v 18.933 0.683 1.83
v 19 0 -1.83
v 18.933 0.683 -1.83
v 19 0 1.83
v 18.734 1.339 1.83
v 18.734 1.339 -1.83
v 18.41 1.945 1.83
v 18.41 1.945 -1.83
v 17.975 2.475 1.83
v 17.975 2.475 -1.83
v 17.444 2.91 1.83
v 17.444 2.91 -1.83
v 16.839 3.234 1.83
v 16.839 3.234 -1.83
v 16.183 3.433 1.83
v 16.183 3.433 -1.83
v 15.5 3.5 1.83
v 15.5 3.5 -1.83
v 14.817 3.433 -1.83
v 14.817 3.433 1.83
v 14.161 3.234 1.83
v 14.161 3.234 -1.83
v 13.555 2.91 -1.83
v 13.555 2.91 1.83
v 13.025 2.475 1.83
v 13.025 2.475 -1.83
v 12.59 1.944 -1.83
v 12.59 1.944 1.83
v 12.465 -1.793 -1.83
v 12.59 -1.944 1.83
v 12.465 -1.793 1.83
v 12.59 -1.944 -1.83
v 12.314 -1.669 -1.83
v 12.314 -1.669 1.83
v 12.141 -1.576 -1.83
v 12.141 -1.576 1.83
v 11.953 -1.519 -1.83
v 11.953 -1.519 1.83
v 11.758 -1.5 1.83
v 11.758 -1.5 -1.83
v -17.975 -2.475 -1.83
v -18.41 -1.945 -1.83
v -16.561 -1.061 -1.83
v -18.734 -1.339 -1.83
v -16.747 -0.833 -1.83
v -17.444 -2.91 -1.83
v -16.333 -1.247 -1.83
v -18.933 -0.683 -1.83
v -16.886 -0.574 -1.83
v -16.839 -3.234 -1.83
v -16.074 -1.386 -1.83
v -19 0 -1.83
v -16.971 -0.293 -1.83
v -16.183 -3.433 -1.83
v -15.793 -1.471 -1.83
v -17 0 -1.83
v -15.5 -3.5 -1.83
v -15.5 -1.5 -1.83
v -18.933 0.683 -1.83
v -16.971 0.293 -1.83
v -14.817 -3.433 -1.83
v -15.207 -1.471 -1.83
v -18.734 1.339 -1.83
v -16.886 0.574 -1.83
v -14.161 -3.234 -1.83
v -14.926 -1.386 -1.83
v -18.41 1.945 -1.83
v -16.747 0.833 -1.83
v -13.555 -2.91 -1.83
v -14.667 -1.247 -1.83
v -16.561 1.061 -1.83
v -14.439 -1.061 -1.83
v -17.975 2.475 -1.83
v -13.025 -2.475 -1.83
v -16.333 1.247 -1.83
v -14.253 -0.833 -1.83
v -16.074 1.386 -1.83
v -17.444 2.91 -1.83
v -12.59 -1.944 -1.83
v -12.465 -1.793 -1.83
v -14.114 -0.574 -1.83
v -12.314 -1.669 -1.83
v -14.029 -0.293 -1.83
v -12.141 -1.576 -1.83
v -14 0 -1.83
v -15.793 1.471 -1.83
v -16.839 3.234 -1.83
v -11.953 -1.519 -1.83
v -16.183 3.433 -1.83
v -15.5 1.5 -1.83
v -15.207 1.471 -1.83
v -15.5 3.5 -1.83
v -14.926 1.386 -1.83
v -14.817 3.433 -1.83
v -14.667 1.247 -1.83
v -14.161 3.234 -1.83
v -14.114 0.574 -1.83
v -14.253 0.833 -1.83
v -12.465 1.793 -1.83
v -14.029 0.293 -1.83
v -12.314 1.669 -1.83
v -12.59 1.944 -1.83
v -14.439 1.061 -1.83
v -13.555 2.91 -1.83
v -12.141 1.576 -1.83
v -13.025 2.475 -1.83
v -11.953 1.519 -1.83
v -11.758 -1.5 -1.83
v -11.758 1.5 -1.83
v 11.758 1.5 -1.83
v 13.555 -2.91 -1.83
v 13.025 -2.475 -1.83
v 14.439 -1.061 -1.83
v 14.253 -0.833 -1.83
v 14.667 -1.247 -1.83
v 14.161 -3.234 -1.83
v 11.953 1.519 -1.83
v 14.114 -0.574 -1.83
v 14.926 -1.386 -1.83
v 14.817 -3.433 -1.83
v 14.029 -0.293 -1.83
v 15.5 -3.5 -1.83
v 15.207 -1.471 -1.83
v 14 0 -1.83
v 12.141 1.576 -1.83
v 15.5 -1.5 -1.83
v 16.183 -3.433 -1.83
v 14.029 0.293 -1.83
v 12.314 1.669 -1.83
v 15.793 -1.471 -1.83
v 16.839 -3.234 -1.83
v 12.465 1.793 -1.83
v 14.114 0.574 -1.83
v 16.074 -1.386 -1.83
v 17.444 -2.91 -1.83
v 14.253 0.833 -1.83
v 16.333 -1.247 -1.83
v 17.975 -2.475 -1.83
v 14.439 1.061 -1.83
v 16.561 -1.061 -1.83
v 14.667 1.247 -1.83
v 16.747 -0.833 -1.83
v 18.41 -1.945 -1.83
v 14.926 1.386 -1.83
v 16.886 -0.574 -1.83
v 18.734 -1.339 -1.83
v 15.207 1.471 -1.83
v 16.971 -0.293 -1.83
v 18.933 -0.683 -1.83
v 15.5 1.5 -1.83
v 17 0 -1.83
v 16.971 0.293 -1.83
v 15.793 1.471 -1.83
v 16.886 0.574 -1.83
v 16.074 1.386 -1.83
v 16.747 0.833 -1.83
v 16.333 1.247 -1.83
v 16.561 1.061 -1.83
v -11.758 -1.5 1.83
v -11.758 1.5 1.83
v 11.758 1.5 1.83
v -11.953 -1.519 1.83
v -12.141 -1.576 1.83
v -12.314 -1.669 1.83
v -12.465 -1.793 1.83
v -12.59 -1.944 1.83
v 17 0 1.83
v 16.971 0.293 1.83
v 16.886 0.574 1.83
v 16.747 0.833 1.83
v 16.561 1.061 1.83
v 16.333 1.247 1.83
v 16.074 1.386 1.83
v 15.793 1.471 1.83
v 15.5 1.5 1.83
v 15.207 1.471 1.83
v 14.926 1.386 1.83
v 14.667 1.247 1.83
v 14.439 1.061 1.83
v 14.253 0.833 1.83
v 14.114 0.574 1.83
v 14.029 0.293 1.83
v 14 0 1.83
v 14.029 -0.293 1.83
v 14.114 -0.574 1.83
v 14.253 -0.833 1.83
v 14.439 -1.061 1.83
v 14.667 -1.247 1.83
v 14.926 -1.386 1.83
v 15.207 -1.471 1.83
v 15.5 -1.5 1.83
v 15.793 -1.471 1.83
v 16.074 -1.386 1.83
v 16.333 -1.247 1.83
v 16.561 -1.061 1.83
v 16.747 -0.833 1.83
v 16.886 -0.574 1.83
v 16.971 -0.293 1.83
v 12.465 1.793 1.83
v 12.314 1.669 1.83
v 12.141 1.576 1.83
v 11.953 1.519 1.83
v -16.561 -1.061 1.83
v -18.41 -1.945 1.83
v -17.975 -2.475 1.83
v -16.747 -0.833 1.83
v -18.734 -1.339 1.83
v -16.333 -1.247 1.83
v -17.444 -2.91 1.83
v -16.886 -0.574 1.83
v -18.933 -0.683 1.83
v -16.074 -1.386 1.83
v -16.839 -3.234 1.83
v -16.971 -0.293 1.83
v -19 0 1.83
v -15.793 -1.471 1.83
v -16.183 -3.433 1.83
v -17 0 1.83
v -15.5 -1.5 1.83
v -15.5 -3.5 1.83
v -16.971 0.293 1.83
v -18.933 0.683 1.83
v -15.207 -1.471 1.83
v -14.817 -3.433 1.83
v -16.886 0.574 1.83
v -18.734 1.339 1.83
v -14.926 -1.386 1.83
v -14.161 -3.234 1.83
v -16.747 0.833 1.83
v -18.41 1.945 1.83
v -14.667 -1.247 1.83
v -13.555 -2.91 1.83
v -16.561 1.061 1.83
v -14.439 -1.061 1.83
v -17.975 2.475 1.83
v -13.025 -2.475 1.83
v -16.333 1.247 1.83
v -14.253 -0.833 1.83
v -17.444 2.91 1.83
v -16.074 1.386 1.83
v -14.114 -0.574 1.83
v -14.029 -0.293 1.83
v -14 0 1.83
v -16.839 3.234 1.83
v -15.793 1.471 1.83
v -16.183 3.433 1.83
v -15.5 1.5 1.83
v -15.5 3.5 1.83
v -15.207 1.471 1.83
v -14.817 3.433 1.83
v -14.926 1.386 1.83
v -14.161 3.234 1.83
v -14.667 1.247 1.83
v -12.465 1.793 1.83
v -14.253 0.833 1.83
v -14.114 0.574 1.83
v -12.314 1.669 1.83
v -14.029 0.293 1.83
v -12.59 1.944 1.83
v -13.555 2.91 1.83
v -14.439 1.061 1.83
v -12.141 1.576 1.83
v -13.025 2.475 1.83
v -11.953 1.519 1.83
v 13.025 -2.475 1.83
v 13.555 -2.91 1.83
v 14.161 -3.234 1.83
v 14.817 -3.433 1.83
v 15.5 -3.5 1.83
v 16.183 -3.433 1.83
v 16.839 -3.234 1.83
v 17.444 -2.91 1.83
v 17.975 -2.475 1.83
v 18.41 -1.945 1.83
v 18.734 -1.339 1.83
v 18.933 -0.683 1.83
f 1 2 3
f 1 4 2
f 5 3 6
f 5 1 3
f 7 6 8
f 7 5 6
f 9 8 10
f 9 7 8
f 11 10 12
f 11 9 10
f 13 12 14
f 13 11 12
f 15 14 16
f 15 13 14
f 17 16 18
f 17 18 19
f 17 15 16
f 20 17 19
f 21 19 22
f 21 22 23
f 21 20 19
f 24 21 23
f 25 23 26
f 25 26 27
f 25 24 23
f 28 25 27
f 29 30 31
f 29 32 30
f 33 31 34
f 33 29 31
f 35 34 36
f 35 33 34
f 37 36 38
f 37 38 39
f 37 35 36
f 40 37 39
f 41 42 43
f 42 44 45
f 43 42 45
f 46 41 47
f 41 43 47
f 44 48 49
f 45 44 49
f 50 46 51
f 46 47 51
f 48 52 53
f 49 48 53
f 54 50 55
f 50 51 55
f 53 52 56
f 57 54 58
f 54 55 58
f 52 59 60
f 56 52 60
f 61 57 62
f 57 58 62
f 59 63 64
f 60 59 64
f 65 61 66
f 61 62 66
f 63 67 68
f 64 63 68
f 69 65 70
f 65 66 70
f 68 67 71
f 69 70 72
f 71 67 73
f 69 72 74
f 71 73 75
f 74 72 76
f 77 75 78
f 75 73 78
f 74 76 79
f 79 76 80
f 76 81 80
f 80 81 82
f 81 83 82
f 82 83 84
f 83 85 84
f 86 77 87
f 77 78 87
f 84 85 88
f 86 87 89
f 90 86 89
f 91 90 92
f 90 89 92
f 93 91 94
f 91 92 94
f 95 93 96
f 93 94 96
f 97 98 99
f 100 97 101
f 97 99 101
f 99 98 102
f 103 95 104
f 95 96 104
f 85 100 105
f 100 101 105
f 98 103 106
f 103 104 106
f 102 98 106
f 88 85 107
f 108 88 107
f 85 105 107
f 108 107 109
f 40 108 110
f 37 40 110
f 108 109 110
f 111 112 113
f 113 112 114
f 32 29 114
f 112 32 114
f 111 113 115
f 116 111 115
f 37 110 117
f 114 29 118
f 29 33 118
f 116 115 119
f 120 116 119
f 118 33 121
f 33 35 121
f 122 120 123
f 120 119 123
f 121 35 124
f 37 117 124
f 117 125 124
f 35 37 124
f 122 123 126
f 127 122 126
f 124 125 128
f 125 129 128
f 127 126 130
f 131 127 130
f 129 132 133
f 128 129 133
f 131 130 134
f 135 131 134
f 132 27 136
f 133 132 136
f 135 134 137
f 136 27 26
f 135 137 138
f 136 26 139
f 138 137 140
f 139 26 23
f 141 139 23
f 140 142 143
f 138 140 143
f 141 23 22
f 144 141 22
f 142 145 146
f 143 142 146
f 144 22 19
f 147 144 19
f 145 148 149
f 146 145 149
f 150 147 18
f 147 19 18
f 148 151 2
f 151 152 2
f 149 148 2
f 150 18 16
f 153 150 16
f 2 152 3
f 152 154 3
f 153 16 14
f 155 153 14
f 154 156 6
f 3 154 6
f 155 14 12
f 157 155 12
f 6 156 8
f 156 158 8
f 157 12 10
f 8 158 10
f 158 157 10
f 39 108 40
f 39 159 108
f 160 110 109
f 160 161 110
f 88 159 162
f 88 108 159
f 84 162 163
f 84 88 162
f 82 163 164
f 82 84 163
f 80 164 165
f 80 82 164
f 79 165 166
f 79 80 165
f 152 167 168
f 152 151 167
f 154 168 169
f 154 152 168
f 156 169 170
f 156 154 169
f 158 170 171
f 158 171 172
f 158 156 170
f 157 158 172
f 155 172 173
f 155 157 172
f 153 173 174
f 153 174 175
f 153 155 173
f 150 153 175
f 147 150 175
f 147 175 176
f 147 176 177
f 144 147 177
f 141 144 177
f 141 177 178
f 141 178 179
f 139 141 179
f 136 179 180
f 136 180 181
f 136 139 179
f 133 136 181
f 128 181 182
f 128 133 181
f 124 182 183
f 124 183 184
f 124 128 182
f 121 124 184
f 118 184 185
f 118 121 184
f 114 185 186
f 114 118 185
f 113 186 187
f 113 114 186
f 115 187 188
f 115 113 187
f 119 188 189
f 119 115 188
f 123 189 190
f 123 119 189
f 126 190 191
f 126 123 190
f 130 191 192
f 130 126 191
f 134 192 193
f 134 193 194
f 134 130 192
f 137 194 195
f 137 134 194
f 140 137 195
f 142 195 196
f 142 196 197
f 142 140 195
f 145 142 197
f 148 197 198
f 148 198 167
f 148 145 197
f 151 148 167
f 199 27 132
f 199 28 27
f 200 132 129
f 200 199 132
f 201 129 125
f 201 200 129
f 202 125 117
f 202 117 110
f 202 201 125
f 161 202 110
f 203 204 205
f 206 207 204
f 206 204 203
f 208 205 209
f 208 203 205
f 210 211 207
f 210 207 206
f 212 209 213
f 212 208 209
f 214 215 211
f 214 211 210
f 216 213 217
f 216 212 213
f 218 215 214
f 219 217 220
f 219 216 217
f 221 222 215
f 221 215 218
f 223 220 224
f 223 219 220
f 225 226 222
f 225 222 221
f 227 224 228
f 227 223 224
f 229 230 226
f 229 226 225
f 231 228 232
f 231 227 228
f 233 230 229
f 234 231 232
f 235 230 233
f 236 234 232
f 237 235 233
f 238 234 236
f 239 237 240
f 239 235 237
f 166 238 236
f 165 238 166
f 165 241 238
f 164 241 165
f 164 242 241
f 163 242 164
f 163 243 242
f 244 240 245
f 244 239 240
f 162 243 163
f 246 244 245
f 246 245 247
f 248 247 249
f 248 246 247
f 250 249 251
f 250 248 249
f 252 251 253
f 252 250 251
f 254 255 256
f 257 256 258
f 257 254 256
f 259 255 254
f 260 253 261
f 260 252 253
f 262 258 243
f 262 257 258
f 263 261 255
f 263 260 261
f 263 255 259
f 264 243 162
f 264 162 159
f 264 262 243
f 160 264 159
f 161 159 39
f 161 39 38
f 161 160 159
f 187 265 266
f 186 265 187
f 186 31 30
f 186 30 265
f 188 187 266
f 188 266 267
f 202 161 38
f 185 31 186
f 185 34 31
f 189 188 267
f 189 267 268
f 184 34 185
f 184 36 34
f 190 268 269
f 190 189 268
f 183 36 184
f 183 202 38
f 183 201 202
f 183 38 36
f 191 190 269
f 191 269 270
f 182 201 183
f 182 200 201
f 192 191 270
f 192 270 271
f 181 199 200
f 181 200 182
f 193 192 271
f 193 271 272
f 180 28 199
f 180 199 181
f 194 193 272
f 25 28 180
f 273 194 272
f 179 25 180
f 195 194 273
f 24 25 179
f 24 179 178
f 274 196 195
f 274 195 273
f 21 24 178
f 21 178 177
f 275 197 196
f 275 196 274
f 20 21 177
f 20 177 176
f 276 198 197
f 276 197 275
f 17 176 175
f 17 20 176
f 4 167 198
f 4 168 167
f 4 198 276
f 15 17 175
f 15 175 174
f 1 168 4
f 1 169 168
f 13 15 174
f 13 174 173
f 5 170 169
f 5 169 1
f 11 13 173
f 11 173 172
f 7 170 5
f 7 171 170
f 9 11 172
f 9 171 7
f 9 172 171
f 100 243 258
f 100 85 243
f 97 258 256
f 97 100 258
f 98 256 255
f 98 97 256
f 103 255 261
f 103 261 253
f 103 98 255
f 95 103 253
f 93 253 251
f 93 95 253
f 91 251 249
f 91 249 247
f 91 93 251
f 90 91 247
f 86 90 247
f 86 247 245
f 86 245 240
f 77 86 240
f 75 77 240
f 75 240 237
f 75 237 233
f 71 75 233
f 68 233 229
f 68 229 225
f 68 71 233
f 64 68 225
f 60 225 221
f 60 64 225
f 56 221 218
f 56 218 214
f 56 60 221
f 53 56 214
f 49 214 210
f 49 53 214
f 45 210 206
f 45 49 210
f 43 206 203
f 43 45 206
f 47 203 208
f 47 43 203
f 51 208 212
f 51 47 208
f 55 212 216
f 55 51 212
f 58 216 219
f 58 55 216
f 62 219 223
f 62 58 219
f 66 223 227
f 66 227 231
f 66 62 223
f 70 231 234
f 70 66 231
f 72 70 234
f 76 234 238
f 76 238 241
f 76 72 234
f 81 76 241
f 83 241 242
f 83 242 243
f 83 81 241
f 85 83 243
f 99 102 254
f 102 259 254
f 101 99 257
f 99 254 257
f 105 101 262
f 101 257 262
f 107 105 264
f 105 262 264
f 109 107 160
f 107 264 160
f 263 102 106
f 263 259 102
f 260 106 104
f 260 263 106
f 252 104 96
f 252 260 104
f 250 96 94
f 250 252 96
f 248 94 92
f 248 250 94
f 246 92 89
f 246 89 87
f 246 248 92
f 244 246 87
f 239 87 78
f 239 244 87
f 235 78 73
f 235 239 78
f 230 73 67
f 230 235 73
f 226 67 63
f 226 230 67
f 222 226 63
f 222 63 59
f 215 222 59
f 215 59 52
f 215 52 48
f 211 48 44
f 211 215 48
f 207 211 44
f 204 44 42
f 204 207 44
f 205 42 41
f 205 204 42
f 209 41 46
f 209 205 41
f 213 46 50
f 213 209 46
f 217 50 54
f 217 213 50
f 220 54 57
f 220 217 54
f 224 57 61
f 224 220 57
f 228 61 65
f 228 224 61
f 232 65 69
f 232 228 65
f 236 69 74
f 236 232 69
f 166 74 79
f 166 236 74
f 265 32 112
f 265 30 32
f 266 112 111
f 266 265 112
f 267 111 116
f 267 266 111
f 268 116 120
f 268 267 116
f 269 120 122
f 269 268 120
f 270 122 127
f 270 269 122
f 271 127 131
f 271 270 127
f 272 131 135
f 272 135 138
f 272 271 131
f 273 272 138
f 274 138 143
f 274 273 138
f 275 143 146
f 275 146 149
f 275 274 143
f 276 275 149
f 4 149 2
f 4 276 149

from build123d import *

# Parameters (mm, degrees)
SKETCH1_R           = 1.5
BOSS_EXTRUDE1_DEPTH = 1.83
FILLET1_R           = 1


with BuildPart() as part:
    # Sketch1 → Boss-Extrude1 (new, symmetric)
    # profile 1 of 3: a face of its own
    with BuildSketch(Plane.XY):
        with BuildLine():
            ThreePointArc((-12, 0), (-12.085474, 0.768774), (-12.337722, 1.5))
            ThreePointArc((-12.337722, 1.5), (-19, 0), (-12.337722, -1.5))
            ThreePointArc((-12.337722, -1.5), (-12.085474, -0.768774), (-12, 0))
        make_face()
        with Locations((-15.5, 0)):
            Circle(SKETCH1_R, mode=Mode.SUBTRACT)
    # profile 2 of 3: a face of its own
    with BuildSketch(Plane.XY):
        with BuildLine():
            Line((12.337722, 1.5), (-12.337722, 1.5))
            ThreePointArc((-12.337722, 1.5), (-12.085474, 0.768774), (-12, 0))
            ThreePointArc((-12, 0), (-12.085474, -0.768774), (-12.337722, -1.5))
            Line((-12.337722, -1.5), (12.337722, -1.5))
            ThreePointArc((12.337722, -1.5), (12, 0), (12.337722, 1.5))
        make_face()
    # profile 3 of 3: a face of its own
    with BuildSketch(Plane.XY):
        with BuildLine():
            ThreePointArc((19, 0), (16.268774, 3.414526), (12.337722, 1.5))
            ThreePointArc((12.337722, 1.5), (12, 0), (12.337722, -1.5))
            ThreePointArc((12.337722, -1.5), (16.268774, -3.414526), (19, 0))
        make_face()
        with Locations((15.5, 0)):
            Circle(SKETCH1_R, mode=Mode.SUBTRACT)
    extrude(amount=BOSS_EXTRUDE1_DEPTH, both=True)

    # Fillet1
    fillet1_edges = [part.edges().sort_by_distance(p)[0] for p in [
        (-12.337722, 1.5, 0),
        (12.337722, 1.5, 0.915),
        (12.337722, -1.5, 0.915),
        (-12.337722, -1.5, 0),
    ]]
    fillet(fillet1_edges, radius=FILLET1_R)


solid = part.part
